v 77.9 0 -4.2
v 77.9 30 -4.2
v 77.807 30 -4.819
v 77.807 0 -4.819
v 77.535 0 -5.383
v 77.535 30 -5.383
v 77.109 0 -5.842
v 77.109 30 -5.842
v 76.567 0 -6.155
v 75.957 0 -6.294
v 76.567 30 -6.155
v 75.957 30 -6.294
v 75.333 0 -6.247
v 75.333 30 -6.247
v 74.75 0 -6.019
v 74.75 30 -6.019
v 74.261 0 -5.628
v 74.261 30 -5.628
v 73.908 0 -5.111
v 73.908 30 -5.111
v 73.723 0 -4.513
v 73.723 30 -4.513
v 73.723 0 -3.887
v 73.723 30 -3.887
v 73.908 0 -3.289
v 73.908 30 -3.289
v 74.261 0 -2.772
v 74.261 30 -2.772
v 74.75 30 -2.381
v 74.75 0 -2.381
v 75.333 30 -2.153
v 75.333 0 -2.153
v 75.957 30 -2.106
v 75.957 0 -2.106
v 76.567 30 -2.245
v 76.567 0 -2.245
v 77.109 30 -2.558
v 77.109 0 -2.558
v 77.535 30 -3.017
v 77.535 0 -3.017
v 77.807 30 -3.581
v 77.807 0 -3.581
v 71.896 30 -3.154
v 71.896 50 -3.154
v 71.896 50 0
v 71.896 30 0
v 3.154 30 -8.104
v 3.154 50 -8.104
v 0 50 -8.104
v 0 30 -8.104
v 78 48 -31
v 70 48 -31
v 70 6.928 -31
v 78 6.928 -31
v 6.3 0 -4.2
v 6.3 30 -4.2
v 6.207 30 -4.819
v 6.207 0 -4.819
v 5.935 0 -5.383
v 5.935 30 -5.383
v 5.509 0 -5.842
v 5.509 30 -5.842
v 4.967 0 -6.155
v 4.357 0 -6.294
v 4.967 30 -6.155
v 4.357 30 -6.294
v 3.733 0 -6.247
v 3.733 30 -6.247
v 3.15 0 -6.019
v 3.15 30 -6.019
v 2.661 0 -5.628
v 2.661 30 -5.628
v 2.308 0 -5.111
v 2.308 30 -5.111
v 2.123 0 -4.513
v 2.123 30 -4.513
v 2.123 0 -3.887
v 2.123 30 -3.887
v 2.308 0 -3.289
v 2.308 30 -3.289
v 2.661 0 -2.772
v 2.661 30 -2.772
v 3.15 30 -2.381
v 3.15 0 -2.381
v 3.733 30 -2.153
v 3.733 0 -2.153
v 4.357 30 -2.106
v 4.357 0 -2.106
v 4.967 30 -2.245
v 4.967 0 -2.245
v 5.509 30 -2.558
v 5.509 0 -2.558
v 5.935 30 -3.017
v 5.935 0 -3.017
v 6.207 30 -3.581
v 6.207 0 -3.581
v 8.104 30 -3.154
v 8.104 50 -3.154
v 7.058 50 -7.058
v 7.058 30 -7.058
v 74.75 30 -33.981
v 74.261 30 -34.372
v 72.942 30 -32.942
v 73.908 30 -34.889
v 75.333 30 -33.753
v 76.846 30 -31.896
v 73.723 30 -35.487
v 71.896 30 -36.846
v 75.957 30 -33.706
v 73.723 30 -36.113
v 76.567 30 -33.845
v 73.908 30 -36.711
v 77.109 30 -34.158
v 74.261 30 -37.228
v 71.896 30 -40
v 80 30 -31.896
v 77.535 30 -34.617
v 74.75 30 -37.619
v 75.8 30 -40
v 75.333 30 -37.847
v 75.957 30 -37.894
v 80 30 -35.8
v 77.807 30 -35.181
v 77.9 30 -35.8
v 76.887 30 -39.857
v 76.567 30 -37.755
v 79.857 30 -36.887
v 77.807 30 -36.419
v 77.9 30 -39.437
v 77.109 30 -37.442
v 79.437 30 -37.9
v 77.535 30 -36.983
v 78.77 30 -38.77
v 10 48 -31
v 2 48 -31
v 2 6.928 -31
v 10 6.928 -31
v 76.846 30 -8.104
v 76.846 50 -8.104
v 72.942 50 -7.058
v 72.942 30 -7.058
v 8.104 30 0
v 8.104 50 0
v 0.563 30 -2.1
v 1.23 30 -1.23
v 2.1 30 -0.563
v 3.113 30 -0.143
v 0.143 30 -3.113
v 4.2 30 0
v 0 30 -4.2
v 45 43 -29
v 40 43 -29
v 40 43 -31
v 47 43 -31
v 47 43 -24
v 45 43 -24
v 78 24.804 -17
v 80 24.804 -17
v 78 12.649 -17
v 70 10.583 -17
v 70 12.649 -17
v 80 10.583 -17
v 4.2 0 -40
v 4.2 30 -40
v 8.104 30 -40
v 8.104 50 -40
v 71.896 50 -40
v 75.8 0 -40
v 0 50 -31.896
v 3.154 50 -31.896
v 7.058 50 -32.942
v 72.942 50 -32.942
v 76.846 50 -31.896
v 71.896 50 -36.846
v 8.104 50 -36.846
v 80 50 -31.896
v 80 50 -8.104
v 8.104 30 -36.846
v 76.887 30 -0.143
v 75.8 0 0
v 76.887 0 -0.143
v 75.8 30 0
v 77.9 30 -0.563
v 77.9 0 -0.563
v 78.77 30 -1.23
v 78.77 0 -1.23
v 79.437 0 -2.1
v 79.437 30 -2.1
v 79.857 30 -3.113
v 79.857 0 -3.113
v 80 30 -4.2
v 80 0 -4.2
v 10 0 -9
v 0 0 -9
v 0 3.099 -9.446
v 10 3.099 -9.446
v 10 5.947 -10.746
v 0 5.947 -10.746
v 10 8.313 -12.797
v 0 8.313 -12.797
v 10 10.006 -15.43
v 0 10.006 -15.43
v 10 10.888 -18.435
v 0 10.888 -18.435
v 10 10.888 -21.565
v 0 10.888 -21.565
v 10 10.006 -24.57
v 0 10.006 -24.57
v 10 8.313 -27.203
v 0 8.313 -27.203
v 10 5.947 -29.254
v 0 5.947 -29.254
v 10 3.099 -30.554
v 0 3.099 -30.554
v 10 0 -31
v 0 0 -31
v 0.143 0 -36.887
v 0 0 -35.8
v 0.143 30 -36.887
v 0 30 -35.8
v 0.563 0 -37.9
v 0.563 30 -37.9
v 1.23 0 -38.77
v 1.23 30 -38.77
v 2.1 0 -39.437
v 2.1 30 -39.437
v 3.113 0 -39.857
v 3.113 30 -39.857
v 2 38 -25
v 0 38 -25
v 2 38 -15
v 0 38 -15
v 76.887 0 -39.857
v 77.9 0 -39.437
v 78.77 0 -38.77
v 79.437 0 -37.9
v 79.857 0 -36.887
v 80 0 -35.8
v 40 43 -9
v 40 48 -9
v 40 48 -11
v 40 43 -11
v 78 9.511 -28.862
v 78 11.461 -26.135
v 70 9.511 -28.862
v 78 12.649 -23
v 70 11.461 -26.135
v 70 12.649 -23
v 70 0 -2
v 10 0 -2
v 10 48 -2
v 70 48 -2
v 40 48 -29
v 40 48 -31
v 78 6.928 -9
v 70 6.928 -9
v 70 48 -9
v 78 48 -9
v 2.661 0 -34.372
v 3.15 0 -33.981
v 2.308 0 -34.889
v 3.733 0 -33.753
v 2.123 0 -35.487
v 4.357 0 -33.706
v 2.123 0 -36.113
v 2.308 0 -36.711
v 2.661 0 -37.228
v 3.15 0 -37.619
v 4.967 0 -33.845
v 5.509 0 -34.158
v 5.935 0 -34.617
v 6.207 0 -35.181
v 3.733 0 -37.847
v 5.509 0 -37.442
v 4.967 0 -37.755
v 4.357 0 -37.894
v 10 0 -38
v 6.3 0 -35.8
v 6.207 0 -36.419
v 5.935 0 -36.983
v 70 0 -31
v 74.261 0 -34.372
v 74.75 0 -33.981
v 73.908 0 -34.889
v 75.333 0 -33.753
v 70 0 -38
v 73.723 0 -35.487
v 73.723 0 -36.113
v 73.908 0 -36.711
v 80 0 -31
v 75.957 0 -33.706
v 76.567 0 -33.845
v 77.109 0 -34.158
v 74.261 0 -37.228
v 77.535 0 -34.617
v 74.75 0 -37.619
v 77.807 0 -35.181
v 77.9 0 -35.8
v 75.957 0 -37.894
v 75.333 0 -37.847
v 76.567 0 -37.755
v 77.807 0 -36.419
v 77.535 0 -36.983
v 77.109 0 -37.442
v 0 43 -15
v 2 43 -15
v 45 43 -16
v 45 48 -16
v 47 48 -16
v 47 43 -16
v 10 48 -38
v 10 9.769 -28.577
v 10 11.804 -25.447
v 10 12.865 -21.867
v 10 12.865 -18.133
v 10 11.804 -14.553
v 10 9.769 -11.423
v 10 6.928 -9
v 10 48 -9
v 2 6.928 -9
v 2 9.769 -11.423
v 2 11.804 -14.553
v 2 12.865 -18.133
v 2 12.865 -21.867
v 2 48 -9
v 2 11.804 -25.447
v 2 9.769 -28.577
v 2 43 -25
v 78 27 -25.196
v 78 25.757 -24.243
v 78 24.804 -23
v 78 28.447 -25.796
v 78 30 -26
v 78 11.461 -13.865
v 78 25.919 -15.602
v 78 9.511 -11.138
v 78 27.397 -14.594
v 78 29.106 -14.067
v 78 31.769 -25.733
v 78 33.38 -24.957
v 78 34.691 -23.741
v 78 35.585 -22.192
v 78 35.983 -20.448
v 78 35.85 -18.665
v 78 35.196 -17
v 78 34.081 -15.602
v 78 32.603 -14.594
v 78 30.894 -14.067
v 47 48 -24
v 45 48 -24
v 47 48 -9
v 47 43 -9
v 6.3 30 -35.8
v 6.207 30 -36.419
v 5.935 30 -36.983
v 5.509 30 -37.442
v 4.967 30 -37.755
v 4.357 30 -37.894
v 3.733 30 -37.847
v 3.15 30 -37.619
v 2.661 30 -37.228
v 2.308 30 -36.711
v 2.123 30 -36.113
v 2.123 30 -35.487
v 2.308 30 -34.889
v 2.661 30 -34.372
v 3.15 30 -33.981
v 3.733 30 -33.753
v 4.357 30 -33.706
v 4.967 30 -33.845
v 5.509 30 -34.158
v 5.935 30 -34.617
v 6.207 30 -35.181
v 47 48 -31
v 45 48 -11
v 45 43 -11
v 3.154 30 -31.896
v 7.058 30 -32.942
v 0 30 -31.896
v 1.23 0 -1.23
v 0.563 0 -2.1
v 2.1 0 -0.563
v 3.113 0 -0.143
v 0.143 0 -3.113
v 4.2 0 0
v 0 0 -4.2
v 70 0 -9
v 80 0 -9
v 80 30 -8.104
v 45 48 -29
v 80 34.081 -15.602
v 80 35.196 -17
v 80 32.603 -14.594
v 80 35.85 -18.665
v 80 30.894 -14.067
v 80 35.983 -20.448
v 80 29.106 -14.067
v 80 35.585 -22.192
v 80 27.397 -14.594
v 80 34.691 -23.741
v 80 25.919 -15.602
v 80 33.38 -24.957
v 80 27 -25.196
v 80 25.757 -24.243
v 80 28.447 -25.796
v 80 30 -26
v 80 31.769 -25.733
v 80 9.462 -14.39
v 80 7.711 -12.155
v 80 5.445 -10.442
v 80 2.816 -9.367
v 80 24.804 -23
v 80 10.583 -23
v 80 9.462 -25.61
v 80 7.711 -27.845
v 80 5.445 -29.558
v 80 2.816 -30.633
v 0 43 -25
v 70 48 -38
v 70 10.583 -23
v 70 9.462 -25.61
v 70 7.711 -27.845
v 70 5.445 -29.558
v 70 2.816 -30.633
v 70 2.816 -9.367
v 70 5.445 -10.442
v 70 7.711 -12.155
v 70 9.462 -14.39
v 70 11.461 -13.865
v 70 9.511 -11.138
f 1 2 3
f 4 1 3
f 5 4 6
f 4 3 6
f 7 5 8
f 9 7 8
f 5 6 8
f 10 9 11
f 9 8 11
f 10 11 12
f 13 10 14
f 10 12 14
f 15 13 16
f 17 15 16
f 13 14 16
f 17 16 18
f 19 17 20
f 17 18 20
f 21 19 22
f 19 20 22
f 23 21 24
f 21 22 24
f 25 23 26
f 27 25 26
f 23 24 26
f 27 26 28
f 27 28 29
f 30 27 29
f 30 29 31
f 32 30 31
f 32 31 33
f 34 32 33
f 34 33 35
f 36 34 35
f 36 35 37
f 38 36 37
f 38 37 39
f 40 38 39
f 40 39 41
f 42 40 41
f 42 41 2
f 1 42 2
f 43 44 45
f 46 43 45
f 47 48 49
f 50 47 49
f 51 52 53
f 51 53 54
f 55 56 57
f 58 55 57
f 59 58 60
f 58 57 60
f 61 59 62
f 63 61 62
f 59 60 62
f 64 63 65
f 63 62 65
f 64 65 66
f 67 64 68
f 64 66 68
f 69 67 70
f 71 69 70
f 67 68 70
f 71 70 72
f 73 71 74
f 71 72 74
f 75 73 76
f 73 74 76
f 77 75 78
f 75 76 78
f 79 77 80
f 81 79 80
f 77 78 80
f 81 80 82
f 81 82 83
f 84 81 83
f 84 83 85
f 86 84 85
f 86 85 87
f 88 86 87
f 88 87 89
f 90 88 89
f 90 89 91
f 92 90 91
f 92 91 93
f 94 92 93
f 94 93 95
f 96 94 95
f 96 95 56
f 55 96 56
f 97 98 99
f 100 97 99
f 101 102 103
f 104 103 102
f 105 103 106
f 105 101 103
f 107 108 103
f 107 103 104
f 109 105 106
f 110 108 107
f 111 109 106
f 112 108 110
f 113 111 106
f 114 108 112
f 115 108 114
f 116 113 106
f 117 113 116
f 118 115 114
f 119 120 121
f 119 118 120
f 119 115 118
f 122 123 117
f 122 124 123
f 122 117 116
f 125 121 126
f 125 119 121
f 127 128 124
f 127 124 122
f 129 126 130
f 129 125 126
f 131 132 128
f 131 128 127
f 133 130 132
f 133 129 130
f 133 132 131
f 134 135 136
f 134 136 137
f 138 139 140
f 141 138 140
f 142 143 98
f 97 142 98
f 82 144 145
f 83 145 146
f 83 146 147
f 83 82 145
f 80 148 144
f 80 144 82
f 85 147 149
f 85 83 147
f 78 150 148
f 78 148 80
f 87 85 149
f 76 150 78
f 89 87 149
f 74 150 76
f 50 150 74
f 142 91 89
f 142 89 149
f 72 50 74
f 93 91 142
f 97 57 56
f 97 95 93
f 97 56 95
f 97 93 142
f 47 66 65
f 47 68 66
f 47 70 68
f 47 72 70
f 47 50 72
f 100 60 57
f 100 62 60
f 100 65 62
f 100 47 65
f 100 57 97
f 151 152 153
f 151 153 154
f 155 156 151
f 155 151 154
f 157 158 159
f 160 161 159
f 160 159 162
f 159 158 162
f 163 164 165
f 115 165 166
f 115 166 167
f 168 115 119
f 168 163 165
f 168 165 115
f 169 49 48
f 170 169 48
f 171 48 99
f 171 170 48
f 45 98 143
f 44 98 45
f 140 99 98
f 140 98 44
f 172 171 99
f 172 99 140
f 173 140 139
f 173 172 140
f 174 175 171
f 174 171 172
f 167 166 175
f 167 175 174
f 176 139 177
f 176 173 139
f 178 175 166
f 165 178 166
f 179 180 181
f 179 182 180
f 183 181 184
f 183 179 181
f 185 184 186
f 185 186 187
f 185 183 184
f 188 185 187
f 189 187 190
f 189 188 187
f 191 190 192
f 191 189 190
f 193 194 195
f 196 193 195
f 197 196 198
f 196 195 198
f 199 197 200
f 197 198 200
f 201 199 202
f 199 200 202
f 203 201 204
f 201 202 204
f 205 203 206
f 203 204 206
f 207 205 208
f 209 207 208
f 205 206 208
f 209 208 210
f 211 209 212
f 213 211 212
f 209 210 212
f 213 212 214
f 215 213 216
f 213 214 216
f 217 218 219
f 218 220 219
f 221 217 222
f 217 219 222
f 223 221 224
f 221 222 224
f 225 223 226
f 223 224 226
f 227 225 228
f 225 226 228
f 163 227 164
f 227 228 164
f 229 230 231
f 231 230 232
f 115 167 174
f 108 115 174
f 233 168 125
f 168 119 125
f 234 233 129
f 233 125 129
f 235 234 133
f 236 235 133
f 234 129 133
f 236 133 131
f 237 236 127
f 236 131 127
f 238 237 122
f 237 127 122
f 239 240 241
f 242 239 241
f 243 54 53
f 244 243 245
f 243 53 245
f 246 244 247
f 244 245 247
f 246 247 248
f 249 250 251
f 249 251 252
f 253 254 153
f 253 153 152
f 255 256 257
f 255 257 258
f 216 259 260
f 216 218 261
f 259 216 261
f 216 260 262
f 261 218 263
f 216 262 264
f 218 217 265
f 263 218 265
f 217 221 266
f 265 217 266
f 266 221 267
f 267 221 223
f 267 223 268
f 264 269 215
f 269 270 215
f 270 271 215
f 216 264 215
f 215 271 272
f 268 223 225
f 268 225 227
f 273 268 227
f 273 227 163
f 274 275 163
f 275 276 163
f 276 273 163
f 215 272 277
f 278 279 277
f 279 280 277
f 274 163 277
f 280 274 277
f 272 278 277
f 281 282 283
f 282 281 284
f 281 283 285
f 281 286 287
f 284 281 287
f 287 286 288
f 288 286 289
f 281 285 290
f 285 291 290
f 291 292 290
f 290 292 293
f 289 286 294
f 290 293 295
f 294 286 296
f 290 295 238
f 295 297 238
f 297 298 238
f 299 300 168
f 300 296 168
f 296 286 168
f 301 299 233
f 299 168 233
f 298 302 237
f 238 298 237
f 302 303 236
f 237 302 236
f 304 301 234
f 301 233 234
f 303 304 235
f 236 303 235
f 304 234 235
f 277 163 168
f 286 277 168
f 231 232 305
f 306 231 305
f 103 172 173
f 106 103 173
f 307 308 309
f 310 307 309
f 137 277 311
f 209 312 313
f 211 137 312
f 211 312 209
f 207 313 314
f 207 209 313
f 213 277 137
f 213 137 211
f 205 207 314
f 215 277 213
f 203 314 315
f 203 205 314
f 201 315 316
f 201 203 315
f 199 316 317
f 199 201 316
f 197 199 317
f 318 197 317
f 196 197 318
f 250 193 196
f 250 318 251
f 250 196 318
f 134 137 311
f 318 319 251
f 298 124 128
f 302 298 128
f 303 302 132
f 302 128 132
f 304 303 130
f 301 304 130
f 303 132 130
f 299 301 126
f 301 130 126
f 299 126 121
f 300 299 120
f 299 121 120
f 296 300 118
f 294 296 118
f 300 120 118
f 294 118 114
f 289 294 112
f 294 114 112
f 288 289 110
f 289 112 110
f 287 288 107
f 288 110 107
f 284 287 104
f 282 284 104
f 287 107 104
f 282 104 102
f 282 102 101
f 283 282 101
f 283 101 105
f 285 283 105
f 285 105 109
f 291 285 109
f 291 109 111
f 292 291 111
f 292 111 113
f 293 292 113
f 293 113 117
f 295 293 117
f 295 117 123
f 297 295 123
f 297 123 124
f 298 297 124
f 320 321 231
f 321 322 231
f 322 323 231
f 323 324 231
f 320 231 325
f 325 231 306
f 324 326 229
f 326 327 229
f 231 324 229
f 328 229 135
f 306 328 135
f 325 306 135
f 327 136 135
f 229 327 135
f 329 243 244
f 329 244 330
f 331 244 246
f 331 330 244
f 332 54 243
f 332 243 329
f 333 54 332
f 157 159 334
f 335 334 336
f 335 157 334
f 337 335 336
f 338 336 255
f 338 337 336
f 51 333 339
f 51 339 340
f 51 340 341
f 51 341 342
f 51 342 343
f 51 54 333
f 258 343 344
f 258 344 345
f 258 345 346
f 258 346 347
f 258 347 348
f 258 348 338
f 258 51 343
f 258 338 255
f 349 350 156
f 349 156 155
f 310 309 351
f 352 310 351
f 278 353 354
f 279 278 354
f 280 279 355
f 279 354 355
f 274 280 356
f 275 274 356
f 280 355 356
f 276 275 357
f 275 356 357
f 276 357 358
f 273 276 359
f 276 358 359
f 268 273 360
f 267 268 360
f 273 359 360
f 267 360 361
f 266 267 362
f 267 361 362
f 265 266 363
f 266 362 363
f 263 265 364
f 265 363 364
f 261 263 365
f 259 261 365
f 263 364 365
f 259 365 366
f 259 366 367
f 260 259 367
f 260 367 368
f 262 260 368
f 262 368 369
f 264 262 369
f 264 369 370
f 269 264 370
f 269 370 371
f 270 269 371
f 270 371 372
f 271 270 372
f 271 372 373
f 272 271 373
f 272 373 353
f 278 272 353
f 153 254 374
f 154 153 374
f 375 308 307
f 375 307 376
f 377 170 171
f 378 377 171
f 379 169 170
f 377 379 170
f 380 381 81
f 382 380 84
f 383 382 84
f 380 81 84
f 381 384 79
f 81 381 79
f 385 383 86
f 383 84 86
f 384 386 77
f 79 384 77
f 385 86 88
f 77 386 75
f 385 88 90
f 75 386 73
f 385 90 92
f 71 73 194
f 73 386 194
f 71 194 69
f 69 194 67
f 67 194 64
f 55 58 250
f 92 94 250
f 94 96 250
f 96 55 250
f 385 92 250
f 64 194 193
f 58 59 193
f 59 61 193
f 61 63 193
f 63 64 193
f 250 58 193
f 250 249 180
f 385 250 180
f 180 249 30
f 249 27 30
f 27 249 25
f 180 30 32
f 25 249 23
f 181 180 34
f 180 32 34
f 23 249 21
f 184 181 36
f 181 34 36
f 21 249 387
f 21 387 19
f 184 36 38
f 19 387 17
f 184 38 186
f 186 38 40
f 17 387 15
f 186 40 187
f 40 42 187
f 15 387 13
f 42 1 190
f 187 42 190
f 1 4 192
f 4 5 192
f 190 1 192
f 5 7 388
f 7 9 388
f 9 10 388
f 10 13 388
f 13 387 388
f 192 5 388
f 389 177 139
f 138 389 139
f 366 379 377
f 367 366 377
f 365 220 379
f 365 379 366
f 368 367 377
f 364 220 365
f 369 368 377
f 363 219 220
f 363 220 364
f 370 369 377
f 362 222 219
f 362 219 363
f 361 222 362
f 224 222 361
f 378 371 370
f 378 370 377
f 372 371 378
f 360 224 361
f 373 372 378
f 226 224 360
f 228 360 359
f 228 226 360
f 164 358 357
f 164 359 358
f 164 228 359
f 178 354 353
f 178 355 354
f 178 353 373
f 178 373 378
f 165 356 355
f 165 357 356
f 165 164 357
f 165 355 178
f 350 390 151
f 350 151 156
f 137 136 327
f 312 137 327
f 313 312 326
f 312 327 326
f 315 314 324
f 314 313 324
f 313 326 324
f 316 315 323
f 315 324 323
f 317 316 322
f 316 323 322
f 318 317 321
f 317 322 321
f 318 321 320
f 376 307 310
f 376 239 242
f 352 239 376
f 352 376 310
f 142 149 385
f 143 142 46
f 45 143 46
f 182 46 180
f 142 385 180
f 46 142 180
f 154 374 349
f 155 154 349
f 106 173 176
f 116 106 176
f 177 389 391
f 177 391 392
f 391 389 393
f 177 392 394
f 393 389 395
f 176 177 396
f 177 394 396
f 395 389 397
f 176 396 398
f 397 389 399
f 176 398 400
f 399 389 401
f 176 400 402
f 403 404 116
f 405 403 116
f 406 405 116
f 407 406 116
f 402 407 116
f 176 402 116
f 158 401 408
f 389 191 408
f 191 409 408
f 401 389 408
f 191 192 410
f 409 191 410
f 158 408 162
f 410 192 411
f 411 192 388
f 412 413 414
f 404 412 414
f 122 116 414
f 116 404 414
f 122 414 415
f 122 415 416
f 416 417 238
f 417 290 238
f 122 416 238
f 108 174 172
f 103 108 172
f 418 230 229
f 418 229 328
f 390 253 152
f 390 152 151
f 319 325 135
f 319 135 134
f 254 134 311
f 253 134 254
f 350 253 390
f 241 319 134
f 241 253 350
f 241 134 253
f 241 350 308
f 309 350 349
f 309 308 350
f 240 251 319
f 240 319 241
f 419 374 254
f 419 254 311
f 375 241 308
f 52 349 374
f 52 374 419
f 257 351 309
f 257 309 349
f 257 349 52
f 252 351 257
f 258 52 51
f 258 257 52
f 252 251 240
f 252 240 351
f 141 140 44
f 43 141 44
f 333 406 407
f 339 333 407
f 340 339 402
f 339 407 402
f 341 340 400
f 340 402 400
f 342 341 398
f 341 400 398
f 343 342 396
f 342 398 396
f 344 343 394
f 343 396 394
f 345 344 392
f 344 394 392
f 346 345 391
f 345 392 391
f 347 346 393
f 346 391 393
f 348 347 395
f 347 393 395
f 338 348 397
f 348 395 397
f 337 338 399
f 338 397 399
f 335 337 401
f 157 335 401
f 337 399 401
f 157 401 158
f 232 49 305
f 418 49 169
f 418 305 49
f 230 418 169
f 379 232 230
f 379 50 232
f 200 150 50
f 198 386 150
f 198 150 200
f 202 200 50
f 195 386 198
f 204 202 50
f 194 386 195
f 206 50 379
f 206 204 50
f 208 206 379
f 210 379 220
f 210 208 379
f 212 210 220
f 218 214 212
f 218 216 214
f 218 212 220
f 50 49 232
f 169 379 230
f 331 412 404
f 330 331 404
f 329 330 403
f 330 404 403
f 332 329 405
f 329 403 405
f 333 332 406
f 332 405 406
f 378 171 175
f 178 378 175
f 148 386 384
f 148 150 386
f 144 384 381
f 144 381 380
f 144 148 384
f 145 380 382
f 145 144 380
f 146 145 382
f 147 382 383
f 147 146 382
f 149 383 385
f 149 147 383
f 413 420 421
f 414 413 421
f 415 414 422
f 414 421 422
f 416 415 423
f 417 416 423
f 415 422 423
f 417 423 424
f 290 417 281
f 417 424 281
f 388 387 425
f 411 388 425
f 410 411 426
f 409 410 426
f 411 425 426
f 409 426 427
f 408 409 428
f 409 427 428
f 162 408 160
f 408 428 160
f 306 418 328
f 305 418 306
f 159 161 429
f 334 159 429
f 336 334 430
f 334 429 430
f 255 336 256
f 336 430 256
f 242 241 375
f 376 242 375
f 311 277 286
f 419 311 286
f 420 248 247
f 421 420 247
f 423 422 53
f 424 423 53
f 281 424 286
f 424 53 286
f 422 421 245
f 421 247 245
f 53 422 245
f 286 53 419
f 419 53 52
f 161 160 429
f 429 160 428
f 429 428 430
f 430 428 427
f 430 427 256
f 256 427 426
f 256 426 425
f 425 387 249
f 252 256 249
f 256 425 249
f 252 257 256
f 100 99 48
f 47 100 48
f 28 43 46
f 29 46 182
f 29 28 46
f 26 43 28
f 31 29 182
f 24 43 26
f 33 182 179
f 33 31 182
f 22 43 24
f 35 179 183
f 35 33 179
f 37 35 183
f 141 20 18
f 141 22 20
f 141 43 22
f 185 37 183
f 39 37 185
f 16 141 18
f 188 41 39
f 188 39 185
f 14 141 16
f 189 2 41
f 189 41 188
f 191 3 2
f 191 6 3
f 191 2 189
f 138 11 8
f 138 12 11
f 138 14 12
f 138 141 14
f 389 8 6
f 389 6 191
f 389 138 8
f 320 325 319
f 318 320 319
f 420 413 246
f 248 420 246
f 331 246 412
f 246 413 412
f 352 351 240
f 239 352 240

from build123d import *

# Parameters (mm, degrees)
ESQUISSE1_W             = 80
ESQUISSE1_H             = 40
BOSS_EXTRU_1_DEPTH      = 50
ENL_V_MAT_EXTRU_1_DEPTH = 78
ESQUISSE3_W             = 2
ESQUISSE3_H             = 50
BOSS_EXTRU_2_DEPTH      = 40
ESQUISSE4_R             = 11
ENL_V_MAT_EXTRU_2_DEPTH = 81
ESQUISSE5_W             = 60
ESQUISSE5_H             = 36
ENL_V_MAT_EXTRU_3_DEPTH = 48
ESQUISSE6_W             = 10
ESQUISSE6_H             = 5
ENL_V_MAT_EXTRU_4_DEPTH = 2
ENL_V_MAT_EXTRU_5_DEPTH = 10
ESQUISSE8_W             = 10
ESQUISSE8_H             = 9
BOSS_EXTRU_3_DEPTH      = 50
ESQUISSE9_R             = 2.1
ENL_V_MAT_EXTRU_6_DEPTH = 51
ESQUISSE10_R            = 2.1
ENL_V_MAT_EXTRU_7_DEPTH = 20
CONG_1_R                = 4.2
ESQUISSE11_W            = 2
ESQUISSE11_H            = 5
ESQUISSE11_W_2          = 7
ESQUISSE11_H_2          = 2
BOSS_EXTRU_4_DEPTH      = 5


with BuildPart() as part:
    # Esquisse1 → Boss.-Extru.1 (new body)
    with BuildSketch(Plane(origin=(0, 0, 0), x_dir=(1, 0, 0), z_dir=(0, 1, 0))):
        with Locations((40, 20)):
            Rectangle(ESQUISSE1_W, ESQUISSE1_H)
    extrude(amount=BOSS_EXTRU_1_DEPTH)

    # Esquisse2 → Enlèv. mat.-Extru.1 (cut)
    with BuildSketch(Plane.ZY):
        with BuildLine():
            Line((-2, 48), (-38, 48))
            Line((-38, 48), (-38, 2))
            Line((-38, 2), (-32.845232579, 2))
            ThreePointArc((-32.845232579, 2), (-20, 13), (-7.154767421, 2))
            Line((-7.154767421, 2), (-2, 2))
            Line((-2, 2), (-2, 48))
        make_face()
    extrude(amount=-ENL_V_MAT_EXTRU_1_DEPTH, mode=Mode.SUBTRACT)

    # Esquisse3 → Boss.-Extru.2 (add)
    with BuildSketch(Plane(origin=(0, 0, -40), x_dir=(-1, 0, 0), z_dir=(0, 0, -1))):
        with Locations((-1, 25)):
            Rectangle(ESQUISSE3_W, ESQUISSE3_H)
    extrude(amount=-BOSS_EXTRU_2_DEPTH)

    # Esquisse4 → Enlèv. mat.-Extru.2 (cut, through all)
    with BuildSketch(Plane.ZY):
        with Locations((-20, 0)):
            Circle(ESQUISSE4_R)
    extrude(amount=-ENL_V_MAT_EXTRU_2_DEPTH, mode=Mode.SUBTRACT)

    # Esquisse5 → Enlèv. mat.-Extru.3 (cut)
    with BuildSketch(Plane.XZ):
        with Locations((40, -20)):
            Rectangle(ESQUISSE5_W, ESQUISSE5_H)
    extrude(amount=-ENL_V_MAT_EXTRU_3_DEPTH, mode=Mode.SUBTRACT)

    # Esquisse6 → Enlèv. mat.-Extru.4 (cut)
    with BuildSketch(Plane.ZY):
        with Locations((-20, 40.5)):
            Rectangle(ESQUISSE6_W, ESQUISSE6_H)
    extrude(amount=-ENL_V_MAT_EXTRU_4_DEPTH, mode=Mode.SUBTRACT)

    # Esquisse7 → Enlèv. mat.-Extru.5 (cut)
    with BuildSketch(Plane(origin=(80, 0, 0), x_dir=(0, 0, -1), z_dir=(1, 0, 0))):
        with BuildLine():
            Line((17, 24.803847577), (17, 27.021710026))
            Line((17, 27.021710026), (23, 27.021710026))
            Line((23, 27.021710026), (23, 24.803847577))
            ThreePointArc((23, 24.803847577), (25.196152423, 27), (26, 30))
            ThreePointArc((26, 30), (17, 35.196152423), (17, 24.803847577))
        make_face()
        with BuildLine():
            Line((23, 27.021710026), (17, 27.021710026))
            Line((17, 27.021710026), (17, 24.803847577))
            ThreePointArc((17, 24.803847577), (20, 24), (23, 24.803847577))
            Line((23, 24.803847577), (23, 27.021710026))
        make_face()
        with BuildLine():
            ThreePointArc((23, 24.803847577), (20, 24), (17, 24.803847577))
            Line((17, 24.803847577), (17, 10.583005244))
            ThreePointArc((17, 10.583005244), (20, 11), (23, 10.583005244))
            Line((23, 10.583005244), (23, 24.803847577))
        make_face()
    extrude(amount=-ENL_V_MAT_EXTRU_5_DEPTH, mode=Mode.SUBTRACT)

    # Esquisse8 → Boss.-Extru.3 (add)
    with BuildSketch(Plane(origin=(0, 50, 0), x_dir=(1, 0, 0), z_dir=(0, 1, 0))):
        with Locations((5, 4.5)):
            Rectangle(ESQUISSE8_W, ESQUISSE8_H)
        with Locations((5, 35.5)):
            Rectangle(ESQUISSE8_W, ESQUISSE8_H)
        with Locations((75, 35.5)):
            Rectangle(ESQUISSE8_W, ESQUISSE8_H)
        with Locations((75, 4.5)):
            Rectangle(ESQUISSE8_W, ESQUISSE8_H)
    extrude(amount=-BOSS_EXTRU_3_DEPTH)

    # Esquisse9 → Enlèv. mat.-Extru.6 (cut, through all)
    with BuildSketch(Plane(origin=(0, 50, 0), x_dir=(1, 0, 0), z_dir=(0, 1, 0))):
        with Locations((75.8, 4.2)):
            Circle(ESQUISSE9_R)
        with Locations((4.2, 4.2)):
            Circle(ESQUISSE9_R)
        with Locations((4.2, 35.8)):
            Circle(ESQUISSE9_R)
        with Locations((75.8, 35.8)):
            Circle(ESQUISSE9_R)
    extrude(amount=-ENL_V_MAT_EXTRU_6_DEPTH, mode=Mode.SUBTRACT)

    # Esquisse10 → Enlèv. mat.-Extru.7 (cut)
    with BuildSketch(Plane(origin=(0, 50, 0), x_dir=(1, 0, 0), z_dir=(0, 1, 0))):
        Polygon((5.246004718, 39.703742751), (8.103742751, 36.846004718), (8.103742751, 40), (0, 40), (0, 31.896257249), (3.153995282, 31.896257249), (0.296257249, 34.753995282), (1.342261967, 38.657738033), align=None)
        Polygon((7.057738033, 32.942261967), (8.103742751, 36.846004718), (5.246004718, 39.703742751), (1.342261967, 38.657738033), (0.296257249, 34.753995282), (3.153995282, 31.896257249), align=None)
        with Locations((4.2, 35.8)):
            Circle(ESQUISSE10_R, mode=Mode.SUBTRACT)
        Polygon((0.296257249, 5.246004718), (1.342261967, 1.342261967), (5.246004718, 0.296257249), (8.103742751, 3.153995282), (7.057738033, 7.057738033), (3.153995282, 8.103742751), align=None)
        with Locations((4.2, 4.2)):
            Circle(ESQUISSE10_R, mode=Mode.SUBTRACT)
        Polygon((3.153995282, 8.103742751), (0, 8.103742751), (0, 0), (8.103742751, 0), (8.103742751, 3.153995282), (5.246004718, 0.296257249), (1.342261967, 1.342261967), (0.296257249, 5.246004718), align=None)
        Polygon((80, 0), (80, 8.103742751), (76.846004718, 8.103742751), (79.703742751, 5.246004718), (78.657738033, 1.342261967), (74.753995282, 0.296257249), (71.896257249, 3.153995282), (71.896257249, 0), align=None)
        Polygon((72.942261967, 7.057738033), (71.896257249, 3.153995282), (74.753995282, 0.296257249), (78.657738033, 1.342261967), (79.703742751, 5.246004718), (76.846004718, 8.103742751), align=None)
        with Locations((75.8, 4.2)):
            Circle(ESQUISSE10_R, mode=Mode.SUBTRACT)
        Polygon((80, 40), (71.896257249, 40), (71.896257249, 36.846004718), (74.753995282, 39.703742751), (78.657738033, 38.657738033), (79.703742751, 34.753995282), (76.846004718, 31.896257249), (80, 31.896257249), align=None)
        Polygon((74.753995282, 39.703742751), (71.896257249, 36.846004718), (72.942261967, 32.942261967), (76.846004718, 31.896257249), (79.703742751, 34.753995282), (78.657738033, 38.657738033), align=None)
        with Locations((75.8, 35.8)):
            Circle(ESQUISSE10_R, mode=Mode.SUBTRACT)
    extrude(amount=-ENL_V_MAT_EXTRU_7_DEPTH, mode=Mode.SUBTRACT)

    # Congé1
    cong_1_edges = [part.edges().sort_by_distance(p)[0] for p in [
        (0, 15, -40),
        (0, 15, 0),
        (80, 15, 0),
        (80, 15, -40),
    ]]
    fillet(cong_1_edges, radius=CONG_1_R)

    # Esquisse11 → Boss.-Extru.4 (add)
    with BuildSketch(Plane.XZ.offset(-48)):
        with Locations((46, -13.5)):
            Rectangle(ESQUISSE11_W, ESQUISSE11_H)
        Polygon((40, -11), (45, -11), (47, -11), (47, -9), (40, -9), align=None)
        with Locations((46, -26.5)):
            Rectangle(ESQUISSE11_W, ESQUISSE11_H)
        with Locations((43.5, -30)):
            Rectangle(ESQUISSE11_W_2, ESQUISSE11_H_2)
    extrude(amount=BOSS_EXTRU_4_DEPTH)


solid = part.part
